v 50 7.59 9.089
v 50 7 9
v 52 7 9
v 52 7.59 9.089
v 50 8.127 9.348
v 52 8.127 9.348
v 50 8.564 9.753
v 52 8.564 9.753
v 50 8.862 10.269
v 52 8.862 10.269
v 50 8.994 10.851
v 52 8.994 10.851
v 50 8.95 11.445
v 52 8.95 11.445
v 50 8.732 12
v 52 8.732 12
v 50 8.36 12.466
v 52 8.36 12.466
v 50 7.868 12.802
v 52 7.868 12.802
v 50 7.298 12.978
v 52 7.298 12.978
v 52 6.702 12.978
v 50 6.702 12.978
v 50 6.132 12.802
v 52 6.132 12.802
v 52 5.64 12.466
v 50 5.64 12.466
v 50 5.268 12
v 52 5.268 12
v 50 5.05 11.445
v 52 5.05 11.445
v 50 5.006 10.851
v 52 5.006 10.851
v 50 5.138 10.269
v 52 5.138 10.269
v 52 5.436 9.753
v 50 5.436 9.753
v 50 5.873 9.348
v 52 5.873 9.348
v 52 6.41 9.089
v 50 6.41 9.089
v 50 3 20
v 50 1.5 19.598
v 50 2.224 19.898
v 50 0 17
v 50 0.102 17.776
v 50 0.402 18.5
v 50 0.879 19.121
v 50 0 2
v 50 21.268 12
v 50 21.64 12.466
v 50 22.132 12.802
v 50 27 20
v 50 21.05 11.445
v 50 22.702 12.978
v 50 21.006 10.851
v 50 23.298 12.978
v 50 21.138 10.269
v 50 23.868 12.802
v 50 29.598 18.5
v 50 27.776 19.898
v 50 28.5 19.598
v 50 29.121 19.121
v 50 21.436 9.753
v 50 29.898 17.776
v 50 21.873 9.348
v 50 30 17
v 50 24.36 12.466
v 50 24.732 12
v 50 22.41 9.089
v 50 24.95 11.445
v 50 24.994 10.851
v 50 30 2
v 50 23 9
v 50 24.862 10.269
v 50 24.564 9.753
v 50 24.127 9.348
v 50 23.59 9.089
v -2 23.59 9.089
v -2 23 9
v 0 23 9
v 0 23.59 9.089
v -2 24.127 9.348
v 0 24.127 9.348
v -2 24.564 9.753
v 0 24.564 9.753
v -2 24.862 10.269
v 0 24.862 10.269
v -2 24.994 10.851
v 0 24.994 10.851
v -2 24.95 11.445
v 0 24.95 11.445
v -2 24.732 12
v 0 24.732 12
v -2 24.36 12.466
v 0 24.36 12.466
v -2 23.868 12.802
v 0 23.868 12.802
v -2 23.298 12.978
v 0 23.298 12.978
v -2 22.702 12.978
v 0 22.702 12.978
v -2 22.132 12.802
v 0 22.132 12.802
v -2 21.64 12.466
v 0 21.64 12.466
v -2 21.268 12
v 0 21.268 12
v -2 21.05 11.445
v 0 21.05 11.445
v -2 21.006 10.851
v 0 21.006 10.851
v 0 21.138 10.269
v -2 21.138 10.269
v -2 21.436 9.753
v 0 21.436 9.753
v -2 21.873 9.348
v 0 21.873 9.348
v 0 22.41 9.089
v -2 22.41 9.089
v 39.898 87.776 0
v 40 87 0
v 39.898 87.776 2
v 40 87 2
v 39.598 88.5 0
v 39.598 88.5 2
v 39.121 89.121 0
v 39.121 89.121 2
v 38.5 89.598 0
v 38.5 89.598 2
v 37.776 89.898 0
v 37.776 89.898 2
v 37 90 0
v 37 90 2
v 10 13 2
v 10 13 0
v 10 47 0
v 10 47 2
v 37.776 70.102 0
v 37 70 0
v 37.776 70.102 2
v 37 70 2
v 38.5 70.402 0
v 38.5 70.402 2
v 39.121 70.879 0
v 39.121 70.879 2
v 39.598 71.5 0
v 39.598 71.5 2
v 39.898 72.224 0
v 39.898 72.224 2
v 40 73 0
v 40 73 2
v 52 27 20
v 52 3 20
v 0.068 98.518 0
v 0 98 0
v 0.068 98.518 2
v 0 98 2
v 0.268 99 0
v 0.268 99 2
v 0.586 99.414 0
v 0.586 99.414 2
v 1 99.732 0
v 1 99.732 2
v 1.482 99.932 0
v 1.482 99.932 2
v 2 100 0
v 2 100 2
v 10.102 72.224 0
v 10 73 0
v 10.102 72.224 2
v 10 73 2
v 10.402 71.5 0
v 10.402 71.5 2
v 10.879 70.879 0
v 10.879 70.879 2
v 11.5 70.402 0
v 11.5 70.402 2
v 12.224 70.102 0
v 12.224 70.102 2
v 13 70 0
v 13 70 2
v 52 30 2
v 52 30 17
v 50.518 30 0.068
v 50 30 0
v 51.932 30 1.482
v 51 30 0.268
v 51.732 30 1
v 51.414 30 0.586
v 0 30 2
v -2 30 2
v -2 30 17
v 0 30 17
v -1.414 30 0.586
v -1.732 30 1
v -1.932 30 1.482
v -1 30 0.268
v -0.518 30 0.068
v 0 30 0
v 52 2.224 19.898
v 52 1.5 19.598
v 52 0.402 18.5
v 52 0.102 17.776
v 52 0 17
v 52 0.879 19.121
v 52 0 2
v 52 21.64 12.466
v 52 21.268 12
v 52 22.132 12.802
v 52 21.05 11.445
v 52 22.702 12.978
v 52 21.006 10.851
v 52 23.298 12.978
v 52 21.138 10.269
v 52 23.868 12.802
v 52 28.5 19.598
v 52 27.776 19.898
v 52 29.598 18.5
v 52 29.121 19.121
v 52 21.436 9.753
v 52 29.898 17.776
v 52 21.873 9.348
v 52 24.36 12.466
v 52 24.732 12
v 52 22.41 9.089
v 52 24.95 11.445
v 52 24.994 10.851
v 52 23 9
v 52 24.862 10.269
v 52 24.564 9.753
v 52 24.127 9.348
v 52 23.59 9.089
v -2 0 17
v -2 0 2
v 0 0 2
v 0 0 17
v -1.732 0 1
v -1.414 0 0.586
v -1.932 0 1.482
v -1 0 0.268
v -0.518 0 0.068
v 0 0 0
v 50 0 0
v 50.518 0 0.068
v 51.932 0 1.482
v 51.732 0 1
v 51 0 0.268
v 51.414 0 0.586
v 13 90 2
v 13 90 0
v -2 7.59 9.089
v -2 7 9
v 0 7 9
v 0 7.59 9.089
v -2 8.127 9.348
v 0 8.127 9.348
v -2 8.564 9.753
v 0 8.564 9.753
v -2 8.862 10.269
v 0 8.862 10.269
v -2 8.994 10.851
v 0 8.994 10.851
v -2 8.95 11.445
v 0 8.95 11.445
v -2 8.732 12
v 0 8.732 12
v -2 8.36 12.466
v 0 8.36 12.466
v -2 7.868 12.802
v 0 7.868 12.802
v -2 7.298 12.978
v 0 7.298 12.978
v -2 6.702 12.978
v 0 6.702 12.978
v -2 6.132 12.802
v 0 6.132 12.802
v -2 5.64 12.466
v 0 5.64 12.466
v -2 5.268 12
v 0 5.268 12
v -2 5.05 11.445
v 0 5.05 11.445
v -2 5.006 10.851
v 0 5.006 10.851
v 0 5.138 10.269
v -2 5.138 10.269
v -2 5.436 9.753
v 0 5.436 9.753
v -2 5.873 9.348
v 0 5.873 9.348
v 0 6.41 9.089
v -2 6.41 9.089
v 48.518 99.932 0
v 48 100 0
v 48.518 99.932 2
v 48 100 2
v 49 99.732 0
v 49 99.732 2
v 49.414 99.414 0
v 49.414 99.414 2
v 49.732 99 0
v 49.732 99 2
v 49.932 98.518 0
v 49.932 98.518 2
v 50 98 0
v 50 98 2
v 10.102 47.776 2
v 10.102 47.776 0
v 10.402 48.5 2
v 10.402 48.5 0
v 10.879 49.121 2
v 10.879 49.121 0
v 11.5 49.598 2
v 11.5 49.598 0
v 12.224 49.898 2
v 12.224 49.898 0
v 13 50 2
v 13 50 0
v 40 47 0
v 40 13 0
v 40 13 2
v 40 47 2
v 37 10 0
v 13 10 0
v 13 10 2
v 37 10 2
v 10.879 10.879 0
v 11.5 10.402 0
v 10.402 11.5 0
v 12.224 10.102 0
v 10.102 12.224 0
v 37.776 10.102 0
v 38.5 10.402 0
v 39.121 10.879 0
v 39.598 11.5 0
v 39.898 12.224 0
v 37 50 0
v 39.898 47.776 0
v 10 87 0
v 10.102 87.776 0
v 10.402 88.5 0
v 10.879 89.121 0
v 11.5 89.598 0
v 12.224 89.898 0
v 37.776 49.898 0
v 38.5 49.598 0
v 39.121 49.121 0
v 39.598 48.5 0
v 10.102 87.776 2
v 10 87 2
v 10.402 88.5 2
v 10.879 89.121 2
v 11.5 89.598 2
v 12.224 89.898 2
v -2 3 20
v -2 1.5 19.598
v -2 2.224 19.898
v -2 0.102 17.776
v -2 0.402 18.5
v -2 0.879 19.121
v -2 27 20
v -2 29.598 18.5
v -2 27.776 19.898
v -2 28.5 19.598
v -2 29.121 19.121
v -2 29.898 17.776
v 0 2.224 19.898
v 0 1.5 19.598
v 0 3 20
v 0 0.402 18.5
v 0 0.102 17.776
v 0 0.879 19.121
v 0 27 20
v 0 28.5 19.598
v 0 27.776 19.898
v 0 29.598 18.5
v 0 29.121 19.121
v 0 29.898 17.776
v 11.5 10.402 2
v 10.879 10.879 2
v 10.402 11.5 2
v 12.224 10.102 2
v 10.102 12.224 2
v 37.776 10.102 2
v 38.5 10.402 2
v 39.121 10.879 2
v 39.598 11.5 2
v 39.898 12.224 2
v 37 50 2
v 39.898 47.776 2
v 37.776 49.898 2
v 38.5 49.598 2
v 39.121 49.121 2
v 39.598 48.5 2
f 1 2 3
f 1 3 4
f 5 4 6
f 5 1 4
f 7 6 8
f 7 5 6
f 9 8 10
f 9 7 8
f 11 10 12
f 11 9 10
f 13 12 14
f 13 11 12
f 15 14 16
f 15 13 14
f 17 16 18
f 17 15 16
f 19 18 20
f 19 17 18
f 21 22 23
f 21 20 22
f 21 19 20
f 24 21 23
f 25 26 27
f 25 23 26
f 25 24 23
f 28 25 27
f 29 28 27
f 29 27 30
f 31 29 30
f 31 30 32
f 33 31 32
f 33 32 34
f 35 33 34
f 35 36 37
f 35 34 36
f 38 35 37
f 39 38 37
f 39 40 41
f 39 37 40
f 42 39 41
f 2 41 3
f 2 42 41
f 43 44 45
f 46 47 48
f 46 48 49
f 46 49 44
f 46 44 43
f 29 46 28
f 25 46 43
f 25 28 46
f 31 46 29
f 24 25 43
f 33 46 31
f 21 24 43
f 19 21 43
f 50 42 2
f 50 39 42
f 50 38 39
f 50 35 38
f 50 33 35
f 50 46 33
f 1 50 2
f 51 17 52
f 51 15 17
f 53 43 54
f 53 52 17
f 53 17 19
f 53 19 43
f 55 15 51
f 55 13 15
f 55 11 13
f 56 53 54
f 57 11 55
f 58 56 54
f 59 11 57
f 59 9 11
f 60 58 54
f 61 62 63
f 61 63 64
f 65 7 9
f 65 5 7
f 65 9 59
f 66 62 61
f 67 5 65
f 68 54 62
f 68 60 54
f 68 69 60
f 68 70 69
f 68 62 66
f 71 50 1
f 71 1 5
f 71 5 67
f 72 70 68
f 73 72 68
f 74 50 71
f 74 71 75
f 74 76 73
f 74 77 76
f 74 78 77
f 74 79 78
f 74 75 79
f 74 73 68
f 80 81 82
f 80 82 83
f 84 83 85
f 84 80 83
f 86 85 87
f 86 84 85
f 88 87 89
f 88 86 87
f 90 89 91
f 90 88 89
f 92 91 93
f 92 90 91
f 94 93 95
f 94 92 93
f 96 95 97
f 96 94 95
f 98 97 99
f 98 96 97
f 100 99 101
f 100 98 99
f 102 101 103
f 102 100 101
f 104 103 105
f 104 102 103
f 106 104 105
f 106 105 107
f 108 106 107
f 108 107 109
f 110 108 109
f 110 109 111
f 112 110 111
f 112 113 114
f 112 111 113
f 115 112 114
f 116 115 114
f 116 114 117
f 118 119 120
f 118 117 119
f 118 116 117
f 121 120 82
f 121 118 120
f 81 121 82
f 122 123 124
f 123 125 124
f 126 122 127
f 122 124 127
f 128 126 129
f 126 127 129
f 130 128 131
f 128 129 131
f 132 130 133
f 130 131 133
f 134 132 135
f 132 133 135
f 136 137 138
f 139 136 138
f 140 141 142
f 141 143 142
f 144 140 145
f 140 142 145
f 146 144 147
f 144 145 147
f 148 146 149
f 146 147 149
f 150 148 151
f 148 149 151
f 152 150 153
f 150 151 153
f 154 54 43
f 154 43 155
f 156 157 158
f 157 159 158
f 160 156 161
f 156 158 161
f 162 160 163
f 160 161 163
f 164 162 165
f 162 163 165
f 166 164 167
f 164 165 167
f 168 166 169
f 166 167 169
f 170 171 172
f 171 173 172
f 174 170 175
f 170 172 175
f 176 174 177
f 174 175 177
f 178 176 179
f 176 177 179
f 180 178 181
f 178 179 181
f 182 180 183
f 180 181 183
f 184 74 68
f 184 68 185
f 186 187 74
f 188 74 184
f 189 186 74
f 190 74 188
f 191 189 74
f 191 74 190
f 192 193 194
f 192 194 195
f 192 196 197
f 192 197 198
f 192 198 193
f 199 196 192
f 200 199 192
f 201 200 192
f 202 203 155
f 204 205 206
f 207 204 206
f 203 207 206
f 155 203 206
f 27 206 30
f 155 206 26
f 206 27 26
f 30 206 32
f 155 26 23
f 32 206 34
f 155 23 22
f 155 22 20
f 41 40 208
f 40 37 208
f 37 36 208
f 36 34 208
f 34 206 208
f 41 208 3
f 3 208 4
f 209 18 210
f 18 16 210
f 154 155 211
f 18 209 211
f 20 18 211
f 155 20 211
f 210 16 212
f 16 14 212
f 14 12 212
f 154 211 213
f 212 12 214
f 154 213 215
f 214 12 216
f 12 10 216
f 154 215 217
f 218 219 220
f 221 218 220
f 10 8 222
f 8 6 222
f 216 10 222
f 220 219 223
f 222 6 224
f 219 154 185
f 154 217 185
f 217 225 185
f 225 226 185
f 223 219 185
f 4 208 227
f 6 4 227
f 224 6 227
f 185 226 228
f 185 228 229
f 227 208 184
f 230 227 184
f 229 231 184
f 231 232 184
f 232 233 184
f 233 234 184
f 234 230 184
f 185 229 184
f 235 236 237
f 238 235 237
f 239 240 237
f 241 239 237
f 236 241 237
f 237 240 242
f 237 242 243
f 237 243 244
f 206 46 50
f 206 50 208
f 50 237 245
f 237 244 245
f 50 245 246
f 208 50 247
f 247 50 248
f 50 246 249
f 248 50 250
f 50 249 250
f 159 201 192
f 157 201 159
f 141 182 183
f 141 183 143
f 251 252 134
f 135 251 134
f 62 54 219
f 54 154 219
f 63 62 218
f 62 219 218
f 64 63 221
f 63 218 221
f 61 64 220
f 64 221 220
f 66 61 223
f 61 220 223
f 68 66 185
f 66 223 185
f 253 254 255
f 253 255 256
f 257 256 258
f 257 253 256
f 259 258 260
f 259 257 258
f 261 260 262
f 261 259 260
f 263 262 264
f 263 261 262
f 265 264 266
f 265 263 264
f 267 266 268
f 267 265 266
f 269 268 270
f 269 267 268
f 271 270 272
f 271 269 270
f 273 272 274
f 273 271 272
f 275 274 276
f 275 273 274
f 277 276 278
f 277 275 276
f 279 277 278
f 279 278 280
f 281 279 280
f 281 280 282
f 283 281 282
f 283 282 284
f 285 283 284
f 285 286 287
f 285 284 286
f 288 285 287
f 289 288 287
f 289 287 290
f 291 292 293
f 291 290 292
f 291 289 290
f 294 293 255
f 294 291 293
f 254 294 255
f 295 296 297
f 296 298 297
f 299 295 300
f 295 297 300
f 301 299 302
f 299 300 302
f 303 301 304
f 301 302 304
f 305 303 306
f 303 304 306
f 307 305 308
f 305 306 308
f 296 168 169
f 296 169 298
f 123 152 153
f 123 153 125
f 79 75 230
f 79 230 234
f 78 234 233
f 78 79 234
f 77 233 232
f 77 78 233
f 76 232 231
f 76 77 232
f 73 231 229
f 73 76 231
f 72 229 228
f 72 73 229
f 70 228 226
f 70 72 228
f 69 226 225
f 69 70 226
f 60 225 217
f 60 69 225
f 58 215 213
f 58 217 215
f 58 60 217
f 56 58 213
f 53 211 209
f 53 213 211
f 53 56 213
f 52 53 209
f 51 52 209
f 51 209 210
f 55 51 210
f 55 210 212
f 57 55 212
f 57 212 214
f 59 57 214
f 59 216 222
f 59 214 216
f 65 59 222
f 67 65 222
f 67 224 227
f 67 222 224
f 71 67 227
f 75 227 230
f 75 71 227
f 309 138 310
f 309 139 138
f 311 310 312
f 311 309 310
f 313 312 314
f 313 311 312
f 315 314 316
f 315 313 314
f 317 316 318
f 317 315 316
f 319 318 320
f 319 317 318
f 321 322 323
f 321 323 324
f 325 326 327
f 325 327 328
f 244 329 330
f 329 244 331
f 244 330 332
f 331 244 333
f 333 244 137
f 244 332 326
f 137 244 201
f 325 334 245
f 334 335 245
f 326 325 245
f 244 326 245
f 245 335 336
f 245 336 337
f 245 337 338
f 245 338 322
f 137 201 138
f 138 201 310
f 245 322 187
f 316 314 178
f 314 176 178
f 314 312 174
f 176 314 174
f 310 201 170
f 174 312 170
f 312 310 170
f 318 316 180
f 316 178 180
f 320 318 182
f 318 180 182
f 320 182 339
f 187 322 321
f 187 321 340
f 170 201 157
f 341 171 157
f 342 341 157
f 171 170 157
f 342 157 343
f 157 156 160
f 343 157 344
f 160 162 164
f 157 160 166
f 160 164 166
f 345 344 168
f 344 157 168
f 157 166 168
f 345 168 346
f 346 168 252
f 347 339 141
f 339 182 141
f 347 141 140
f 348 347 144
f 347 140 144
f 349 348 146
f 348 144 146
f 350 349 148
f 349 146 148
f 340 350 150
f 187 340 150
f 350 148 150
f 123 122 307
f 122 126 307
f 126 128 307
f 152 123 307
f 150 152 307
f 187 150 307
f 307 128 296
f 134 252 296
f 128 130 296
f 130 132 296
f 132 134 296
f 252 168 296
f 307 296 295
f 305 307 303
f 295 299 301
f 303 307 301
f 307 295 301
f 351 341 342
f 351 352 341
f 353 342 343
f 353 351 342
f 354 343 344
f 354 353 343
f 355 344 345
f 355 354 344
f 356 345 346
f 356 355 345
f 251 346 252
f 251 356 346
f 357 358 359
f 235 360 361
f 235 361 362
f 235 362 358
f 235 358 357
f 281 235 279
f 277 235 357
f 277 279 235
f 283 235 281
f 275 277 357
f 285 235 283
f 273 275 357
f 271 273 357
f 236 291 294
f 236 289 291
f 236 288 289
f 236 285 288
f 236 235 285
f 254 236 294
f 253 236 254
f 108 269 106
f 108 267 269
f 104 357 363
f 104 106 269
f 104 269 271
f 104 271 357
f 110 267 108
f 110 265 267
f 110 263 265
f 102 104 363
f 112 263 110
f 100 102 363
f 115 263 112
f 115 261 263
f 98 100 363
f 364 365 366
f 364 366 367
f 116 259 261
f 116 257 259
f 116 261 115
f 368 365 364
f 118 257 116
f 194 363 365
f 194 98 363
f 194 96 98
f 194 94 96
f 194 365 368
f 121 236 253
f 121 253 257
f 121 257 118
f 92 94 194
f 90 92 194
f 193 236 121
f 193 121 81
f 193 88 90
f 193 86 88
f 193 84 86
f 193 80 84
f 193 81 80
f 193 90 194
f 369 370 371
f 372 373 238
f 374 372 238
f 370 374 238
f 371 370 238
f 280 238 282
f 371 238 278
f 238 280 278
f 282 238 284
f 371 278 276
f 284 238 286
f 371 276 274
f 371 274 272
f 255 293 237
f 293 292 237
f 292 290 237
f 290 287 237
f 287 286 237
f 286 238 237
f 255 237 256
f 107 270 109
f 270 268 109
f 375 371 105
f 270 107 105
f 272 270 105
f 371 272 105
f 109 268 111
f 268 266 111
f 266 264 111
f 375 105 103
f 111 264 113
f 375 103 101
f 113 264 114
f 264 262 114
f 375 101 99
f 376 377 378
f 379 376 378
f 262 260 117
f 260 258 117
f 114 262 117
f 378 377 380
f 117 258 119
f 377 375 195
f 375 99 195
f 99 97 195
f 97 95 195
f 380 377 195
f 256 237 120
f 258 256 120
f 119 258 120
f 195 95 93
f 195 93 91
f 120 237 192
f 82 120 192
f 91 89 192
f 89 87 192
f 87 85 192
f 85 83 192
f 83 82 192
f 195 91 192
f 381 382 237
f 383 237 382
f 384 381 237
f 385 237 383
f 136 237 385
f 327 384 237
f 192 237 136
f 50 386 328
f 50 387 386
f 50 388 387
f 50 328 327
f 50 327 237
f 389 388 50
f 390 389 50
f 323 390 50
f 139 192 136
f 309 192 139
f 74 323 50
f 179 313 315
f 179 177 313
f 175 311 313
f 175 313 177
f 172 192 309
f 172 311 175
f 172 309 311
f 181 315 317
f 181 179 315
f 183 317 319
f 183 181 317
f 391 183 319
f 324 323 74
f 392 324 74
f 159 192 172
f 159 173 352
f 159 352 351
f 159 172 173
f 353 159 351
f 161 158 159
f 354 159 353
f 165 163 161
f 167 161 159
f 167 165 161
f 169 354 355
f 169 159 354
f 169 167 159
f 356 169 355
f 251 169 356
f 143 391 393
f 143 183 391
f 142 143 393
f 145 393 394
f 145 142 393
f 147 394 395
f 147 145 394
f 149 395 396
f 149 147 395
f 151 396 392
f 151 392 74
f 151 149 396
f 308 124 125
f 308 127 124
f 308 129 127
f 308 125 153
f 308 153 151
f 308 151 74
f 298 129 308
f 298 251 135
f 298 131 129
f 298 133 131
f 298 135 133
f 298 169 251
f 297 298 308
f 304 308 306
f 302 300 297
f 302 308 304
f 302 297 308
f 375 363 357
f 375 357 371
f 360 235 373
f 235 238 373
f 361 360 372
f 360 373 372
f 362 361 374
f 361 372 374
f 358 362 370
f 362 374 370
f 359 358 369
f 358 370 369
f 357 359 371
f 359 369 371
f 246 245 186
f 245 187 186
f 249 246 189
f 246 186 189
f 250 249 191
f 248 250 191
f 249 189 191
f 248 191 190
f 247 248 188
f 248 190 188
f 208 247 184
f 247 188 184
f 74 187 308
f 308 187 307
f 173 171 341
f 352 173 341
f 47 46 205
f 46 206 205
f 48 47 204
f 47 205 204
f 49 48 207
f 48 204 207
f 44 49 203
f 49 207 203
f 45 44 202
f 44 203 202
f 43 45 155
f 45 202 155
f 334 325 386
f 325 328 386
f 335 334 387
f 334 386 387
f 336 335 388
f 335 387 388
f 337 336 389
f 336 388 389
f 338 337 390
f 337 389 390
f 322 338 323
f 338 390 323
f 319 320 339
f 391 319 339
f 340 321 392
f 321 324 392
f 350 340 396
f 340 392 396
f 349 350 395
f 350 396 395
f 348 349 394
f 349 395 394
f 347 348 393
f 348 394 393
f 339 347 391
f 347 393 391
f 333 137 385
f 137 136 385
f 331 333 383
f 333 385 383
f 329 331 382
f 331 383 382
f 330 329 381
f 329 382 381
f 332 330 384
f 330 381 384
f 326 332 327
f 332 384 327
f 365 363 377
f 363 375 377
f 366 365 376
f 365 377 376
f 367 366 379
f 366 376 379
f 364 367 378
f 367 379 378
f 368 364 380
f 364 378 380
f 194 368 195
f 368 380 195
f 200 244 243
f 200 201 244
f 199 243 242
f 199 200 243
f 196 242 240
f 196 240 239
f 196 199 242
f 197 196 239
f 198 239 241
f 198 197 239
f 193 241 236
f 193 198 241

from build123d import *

# Parameters (mm, degrees)
CYLINDER001_R     = 2
CYLINDER001_DEPTH = 4
CYLINDER_R        = 2
CYLINDER_DEPTH    = 4
BOX003_W          = 2
BOX003_H          = 30
BOX003_DEPTH      = 20
FILLET_R          = 3
BOX002_W          = 30
BOX002_H          = 40
BOX002_DEPTH      = 2.4
BOX001_W          = 30
BOX001_H          = 20
BOX001_DEPTH      = 2.4
BOX_W             = 50
BOX_H             = 100
BOX_DEPTH         = 2
FILLET002_R       = 3
FILLET003_R       = 2
CYLINDER003_R     = 2
CYLINDER003_DEPTH = 4
CYLINDER002_R     = 2
CYLINDER002_DEPTH = 4
BOX004_W          = 2
BOX004_H          = 30
BOX004_DEPTH      = 20
FILLET001_R       = 3
FILLET004_R       = 2


with BuildPart() as cylinder001:
    # Cylinder001 → Cylinder001 (new body)
    with BuildSketch(Plane(origin=(-3, 23, 11), x_dir=(0, 0, -1), z_dir=(1, 0, 0))):
        Circle(CYLINDER001_R)
    extrude(amount=CYLINDER001_DEPTH)


with BuildPart() as fusion001:
    # Cylinder → Cylinder (new body)
    with BuildSketch(Plane(origin=(-3, 7, 11), x_dir=(0, 0, -1), z_dir=(1, 0, 0))):
        Circle(CYLINDER_R)
    extrude(amount=CYLINDER_DEPTH)

    # Fusion001: union Cylinder001
    add(cylinder001.part)


with BuildPart() as ala_izquierda_redondeada:
    # Box003 → Box003 (new body)
    with BuildSketch(Plane(origin=(-2, 0, 0), x_dir=(1, 0, 0), z_dir=(0, 0, 1))):
        with Locations((1, 15)):
            Rectangle(BOX003_W, BOX003_H)
    extrude(amount=BOX003_DEPTH)

    # Cut001: cut Fusion001
    add(fusion001.part, mode=Mode.SUBTRACT)

    # Fillet
    fillet_edges = [ala_izquierda_redondeada.edges().sort_by_distance(p)[0] for p in [
        (-1, 0, 20),
        (-1, 30, 20),
    ]]
    fillet(fillet_edges, radius=FILLET_R)


with BuildPart() as hueco_inferior_40x30:
    # Box002 → Box002 (new body)
    with BuildSketch(Plane(origin=(10, 10, -0.2), x_dir=(1, 0, 0), z_dir=(0, 0, 1))):
        with Locations((15, 20)):
            Rectangle(BOX002_W, BOX002_H)
    extrude(amount=BOX002_DEPTH)


with BuildPart() as huecos_base:
    # Box001 → Box001 (new body)
    with BuildSketch(Plane(origin=(10, 70, -0.2), x_dir=(1, 0, 0), z_dir=(0, 0, 1))):
        with Locations((15, 10)):
            Rectangle(BOX001_W, BOX001_H)
    extrude(amount=BOX001_DEPTH)

    # Fusion: union hueco_inferior_40x30
    add(hueco_inferior_40x30.part)


with BuildPart() as base_perforada_redondeada_externo_2mm:
    # Box → Box (new body)
    with BuildSketch(Plane.XY):
        with Locations((25, 50)):
            Rectangle(BOX_W, BOX_H)
    extrude(amount=BOX_DEPTH)

    # Cut: cut huecos_base
    add(huecos_base.part, mode=Mode.SUBTRACT)

    # Fillet002
    fillet002_edges = [base_perforada_redondeada_externo_2mm.edges().sort_by_distance(p)[0] for p in [
        (40, 70, 1),
        (10, 70, 1),
        (40, 90, 1),
        (10, 90, 1),
        (40, 10, 1),
        (10, 10, 1),
        (40, 50, 1),
        (10, 50, 1),
    ]]
    fillet(fillet002_edges, radius=FILLET002_R)

    # Fillet003
    fillet003_edges = [base_perforada_redondeada_externo_2mm.edges().sort_by_distance(p)[0] for p in [
        (0, 100, 1),
        (50, 100, 1),
    ]]
    fillet(fillet003_edges, radius=FILLET003_R)


with BuildPart() as cylinder003:
    # Cylinder003 → Cylinder003 (new body)
    with BuildSketch(Plane(origin=(-3, 23, 11), x_dir=(0, 0, -1), z_dir=(1, 0, 0))):
        Circle(CYLINDER003_R)
    extrude(amount=CYLINDER003_DEPTH)


with BuildPart() as fusion002:
    # Cylinder002 → Cylinder002 (new body)
    with BuildSketch(Plane(origin=(-3, 7, 11), x_dir=(0, 0, -1), z_dir=(1, 0, 0))):
        Circle(CYLINDER002_R)
    extrude(amount=CYLINDER002_DEPTH)

    # Fusion002: union Cylinder003
    add(cylinder003.part)


with BuildPart() as pieza_final:
    # Box004 → Box004 (new body)
    with BuildSketch(Plane(origin=(-2, 0, 0), x_dir=(1, 0, 0), z_dir=(0, 0, 1))):
        with Locations((1, 15)):
            Rectangle(BOX004_W, BOX004_H)
    extrude(amount=BOX004_DEPTH)

    # Cut002: cut Fusion002
    add(fusion002.part, mode=Mode.SUBTRACT)

    # Fillet001
    fillet001_edges = [pieza_final.edges().sort_by_distance(p)[0] for p in [
        (-1, 0, 20),
        (-1, 30, 20),
    ]]
    fillet(fillet001_edges, radius=FILLET001_R)


with BuildPart() as pieza_final_1:
    # Fillet001 placement: moved
    add(pieza_final.part.moved(Location((52, 0, 0))))

    # Fusion003: union ala_izquierda_redondeada, base_perforada_redondeada_externo_2mm
    add(ala_izquierda_redondeada.part)
    add(base_perforada_redondeada_externo_2mm.part)

    # Fillet004
    fillet004_edges = [pieza_final_1.edges().sort_by_distance(p)[0] for p in [
        (52, 15, 0),
        (-2, 15, 0),
    ]]
    fillet(fillet004_edges, radius=FILLET004_R)


solid = pieza_final_1.part
